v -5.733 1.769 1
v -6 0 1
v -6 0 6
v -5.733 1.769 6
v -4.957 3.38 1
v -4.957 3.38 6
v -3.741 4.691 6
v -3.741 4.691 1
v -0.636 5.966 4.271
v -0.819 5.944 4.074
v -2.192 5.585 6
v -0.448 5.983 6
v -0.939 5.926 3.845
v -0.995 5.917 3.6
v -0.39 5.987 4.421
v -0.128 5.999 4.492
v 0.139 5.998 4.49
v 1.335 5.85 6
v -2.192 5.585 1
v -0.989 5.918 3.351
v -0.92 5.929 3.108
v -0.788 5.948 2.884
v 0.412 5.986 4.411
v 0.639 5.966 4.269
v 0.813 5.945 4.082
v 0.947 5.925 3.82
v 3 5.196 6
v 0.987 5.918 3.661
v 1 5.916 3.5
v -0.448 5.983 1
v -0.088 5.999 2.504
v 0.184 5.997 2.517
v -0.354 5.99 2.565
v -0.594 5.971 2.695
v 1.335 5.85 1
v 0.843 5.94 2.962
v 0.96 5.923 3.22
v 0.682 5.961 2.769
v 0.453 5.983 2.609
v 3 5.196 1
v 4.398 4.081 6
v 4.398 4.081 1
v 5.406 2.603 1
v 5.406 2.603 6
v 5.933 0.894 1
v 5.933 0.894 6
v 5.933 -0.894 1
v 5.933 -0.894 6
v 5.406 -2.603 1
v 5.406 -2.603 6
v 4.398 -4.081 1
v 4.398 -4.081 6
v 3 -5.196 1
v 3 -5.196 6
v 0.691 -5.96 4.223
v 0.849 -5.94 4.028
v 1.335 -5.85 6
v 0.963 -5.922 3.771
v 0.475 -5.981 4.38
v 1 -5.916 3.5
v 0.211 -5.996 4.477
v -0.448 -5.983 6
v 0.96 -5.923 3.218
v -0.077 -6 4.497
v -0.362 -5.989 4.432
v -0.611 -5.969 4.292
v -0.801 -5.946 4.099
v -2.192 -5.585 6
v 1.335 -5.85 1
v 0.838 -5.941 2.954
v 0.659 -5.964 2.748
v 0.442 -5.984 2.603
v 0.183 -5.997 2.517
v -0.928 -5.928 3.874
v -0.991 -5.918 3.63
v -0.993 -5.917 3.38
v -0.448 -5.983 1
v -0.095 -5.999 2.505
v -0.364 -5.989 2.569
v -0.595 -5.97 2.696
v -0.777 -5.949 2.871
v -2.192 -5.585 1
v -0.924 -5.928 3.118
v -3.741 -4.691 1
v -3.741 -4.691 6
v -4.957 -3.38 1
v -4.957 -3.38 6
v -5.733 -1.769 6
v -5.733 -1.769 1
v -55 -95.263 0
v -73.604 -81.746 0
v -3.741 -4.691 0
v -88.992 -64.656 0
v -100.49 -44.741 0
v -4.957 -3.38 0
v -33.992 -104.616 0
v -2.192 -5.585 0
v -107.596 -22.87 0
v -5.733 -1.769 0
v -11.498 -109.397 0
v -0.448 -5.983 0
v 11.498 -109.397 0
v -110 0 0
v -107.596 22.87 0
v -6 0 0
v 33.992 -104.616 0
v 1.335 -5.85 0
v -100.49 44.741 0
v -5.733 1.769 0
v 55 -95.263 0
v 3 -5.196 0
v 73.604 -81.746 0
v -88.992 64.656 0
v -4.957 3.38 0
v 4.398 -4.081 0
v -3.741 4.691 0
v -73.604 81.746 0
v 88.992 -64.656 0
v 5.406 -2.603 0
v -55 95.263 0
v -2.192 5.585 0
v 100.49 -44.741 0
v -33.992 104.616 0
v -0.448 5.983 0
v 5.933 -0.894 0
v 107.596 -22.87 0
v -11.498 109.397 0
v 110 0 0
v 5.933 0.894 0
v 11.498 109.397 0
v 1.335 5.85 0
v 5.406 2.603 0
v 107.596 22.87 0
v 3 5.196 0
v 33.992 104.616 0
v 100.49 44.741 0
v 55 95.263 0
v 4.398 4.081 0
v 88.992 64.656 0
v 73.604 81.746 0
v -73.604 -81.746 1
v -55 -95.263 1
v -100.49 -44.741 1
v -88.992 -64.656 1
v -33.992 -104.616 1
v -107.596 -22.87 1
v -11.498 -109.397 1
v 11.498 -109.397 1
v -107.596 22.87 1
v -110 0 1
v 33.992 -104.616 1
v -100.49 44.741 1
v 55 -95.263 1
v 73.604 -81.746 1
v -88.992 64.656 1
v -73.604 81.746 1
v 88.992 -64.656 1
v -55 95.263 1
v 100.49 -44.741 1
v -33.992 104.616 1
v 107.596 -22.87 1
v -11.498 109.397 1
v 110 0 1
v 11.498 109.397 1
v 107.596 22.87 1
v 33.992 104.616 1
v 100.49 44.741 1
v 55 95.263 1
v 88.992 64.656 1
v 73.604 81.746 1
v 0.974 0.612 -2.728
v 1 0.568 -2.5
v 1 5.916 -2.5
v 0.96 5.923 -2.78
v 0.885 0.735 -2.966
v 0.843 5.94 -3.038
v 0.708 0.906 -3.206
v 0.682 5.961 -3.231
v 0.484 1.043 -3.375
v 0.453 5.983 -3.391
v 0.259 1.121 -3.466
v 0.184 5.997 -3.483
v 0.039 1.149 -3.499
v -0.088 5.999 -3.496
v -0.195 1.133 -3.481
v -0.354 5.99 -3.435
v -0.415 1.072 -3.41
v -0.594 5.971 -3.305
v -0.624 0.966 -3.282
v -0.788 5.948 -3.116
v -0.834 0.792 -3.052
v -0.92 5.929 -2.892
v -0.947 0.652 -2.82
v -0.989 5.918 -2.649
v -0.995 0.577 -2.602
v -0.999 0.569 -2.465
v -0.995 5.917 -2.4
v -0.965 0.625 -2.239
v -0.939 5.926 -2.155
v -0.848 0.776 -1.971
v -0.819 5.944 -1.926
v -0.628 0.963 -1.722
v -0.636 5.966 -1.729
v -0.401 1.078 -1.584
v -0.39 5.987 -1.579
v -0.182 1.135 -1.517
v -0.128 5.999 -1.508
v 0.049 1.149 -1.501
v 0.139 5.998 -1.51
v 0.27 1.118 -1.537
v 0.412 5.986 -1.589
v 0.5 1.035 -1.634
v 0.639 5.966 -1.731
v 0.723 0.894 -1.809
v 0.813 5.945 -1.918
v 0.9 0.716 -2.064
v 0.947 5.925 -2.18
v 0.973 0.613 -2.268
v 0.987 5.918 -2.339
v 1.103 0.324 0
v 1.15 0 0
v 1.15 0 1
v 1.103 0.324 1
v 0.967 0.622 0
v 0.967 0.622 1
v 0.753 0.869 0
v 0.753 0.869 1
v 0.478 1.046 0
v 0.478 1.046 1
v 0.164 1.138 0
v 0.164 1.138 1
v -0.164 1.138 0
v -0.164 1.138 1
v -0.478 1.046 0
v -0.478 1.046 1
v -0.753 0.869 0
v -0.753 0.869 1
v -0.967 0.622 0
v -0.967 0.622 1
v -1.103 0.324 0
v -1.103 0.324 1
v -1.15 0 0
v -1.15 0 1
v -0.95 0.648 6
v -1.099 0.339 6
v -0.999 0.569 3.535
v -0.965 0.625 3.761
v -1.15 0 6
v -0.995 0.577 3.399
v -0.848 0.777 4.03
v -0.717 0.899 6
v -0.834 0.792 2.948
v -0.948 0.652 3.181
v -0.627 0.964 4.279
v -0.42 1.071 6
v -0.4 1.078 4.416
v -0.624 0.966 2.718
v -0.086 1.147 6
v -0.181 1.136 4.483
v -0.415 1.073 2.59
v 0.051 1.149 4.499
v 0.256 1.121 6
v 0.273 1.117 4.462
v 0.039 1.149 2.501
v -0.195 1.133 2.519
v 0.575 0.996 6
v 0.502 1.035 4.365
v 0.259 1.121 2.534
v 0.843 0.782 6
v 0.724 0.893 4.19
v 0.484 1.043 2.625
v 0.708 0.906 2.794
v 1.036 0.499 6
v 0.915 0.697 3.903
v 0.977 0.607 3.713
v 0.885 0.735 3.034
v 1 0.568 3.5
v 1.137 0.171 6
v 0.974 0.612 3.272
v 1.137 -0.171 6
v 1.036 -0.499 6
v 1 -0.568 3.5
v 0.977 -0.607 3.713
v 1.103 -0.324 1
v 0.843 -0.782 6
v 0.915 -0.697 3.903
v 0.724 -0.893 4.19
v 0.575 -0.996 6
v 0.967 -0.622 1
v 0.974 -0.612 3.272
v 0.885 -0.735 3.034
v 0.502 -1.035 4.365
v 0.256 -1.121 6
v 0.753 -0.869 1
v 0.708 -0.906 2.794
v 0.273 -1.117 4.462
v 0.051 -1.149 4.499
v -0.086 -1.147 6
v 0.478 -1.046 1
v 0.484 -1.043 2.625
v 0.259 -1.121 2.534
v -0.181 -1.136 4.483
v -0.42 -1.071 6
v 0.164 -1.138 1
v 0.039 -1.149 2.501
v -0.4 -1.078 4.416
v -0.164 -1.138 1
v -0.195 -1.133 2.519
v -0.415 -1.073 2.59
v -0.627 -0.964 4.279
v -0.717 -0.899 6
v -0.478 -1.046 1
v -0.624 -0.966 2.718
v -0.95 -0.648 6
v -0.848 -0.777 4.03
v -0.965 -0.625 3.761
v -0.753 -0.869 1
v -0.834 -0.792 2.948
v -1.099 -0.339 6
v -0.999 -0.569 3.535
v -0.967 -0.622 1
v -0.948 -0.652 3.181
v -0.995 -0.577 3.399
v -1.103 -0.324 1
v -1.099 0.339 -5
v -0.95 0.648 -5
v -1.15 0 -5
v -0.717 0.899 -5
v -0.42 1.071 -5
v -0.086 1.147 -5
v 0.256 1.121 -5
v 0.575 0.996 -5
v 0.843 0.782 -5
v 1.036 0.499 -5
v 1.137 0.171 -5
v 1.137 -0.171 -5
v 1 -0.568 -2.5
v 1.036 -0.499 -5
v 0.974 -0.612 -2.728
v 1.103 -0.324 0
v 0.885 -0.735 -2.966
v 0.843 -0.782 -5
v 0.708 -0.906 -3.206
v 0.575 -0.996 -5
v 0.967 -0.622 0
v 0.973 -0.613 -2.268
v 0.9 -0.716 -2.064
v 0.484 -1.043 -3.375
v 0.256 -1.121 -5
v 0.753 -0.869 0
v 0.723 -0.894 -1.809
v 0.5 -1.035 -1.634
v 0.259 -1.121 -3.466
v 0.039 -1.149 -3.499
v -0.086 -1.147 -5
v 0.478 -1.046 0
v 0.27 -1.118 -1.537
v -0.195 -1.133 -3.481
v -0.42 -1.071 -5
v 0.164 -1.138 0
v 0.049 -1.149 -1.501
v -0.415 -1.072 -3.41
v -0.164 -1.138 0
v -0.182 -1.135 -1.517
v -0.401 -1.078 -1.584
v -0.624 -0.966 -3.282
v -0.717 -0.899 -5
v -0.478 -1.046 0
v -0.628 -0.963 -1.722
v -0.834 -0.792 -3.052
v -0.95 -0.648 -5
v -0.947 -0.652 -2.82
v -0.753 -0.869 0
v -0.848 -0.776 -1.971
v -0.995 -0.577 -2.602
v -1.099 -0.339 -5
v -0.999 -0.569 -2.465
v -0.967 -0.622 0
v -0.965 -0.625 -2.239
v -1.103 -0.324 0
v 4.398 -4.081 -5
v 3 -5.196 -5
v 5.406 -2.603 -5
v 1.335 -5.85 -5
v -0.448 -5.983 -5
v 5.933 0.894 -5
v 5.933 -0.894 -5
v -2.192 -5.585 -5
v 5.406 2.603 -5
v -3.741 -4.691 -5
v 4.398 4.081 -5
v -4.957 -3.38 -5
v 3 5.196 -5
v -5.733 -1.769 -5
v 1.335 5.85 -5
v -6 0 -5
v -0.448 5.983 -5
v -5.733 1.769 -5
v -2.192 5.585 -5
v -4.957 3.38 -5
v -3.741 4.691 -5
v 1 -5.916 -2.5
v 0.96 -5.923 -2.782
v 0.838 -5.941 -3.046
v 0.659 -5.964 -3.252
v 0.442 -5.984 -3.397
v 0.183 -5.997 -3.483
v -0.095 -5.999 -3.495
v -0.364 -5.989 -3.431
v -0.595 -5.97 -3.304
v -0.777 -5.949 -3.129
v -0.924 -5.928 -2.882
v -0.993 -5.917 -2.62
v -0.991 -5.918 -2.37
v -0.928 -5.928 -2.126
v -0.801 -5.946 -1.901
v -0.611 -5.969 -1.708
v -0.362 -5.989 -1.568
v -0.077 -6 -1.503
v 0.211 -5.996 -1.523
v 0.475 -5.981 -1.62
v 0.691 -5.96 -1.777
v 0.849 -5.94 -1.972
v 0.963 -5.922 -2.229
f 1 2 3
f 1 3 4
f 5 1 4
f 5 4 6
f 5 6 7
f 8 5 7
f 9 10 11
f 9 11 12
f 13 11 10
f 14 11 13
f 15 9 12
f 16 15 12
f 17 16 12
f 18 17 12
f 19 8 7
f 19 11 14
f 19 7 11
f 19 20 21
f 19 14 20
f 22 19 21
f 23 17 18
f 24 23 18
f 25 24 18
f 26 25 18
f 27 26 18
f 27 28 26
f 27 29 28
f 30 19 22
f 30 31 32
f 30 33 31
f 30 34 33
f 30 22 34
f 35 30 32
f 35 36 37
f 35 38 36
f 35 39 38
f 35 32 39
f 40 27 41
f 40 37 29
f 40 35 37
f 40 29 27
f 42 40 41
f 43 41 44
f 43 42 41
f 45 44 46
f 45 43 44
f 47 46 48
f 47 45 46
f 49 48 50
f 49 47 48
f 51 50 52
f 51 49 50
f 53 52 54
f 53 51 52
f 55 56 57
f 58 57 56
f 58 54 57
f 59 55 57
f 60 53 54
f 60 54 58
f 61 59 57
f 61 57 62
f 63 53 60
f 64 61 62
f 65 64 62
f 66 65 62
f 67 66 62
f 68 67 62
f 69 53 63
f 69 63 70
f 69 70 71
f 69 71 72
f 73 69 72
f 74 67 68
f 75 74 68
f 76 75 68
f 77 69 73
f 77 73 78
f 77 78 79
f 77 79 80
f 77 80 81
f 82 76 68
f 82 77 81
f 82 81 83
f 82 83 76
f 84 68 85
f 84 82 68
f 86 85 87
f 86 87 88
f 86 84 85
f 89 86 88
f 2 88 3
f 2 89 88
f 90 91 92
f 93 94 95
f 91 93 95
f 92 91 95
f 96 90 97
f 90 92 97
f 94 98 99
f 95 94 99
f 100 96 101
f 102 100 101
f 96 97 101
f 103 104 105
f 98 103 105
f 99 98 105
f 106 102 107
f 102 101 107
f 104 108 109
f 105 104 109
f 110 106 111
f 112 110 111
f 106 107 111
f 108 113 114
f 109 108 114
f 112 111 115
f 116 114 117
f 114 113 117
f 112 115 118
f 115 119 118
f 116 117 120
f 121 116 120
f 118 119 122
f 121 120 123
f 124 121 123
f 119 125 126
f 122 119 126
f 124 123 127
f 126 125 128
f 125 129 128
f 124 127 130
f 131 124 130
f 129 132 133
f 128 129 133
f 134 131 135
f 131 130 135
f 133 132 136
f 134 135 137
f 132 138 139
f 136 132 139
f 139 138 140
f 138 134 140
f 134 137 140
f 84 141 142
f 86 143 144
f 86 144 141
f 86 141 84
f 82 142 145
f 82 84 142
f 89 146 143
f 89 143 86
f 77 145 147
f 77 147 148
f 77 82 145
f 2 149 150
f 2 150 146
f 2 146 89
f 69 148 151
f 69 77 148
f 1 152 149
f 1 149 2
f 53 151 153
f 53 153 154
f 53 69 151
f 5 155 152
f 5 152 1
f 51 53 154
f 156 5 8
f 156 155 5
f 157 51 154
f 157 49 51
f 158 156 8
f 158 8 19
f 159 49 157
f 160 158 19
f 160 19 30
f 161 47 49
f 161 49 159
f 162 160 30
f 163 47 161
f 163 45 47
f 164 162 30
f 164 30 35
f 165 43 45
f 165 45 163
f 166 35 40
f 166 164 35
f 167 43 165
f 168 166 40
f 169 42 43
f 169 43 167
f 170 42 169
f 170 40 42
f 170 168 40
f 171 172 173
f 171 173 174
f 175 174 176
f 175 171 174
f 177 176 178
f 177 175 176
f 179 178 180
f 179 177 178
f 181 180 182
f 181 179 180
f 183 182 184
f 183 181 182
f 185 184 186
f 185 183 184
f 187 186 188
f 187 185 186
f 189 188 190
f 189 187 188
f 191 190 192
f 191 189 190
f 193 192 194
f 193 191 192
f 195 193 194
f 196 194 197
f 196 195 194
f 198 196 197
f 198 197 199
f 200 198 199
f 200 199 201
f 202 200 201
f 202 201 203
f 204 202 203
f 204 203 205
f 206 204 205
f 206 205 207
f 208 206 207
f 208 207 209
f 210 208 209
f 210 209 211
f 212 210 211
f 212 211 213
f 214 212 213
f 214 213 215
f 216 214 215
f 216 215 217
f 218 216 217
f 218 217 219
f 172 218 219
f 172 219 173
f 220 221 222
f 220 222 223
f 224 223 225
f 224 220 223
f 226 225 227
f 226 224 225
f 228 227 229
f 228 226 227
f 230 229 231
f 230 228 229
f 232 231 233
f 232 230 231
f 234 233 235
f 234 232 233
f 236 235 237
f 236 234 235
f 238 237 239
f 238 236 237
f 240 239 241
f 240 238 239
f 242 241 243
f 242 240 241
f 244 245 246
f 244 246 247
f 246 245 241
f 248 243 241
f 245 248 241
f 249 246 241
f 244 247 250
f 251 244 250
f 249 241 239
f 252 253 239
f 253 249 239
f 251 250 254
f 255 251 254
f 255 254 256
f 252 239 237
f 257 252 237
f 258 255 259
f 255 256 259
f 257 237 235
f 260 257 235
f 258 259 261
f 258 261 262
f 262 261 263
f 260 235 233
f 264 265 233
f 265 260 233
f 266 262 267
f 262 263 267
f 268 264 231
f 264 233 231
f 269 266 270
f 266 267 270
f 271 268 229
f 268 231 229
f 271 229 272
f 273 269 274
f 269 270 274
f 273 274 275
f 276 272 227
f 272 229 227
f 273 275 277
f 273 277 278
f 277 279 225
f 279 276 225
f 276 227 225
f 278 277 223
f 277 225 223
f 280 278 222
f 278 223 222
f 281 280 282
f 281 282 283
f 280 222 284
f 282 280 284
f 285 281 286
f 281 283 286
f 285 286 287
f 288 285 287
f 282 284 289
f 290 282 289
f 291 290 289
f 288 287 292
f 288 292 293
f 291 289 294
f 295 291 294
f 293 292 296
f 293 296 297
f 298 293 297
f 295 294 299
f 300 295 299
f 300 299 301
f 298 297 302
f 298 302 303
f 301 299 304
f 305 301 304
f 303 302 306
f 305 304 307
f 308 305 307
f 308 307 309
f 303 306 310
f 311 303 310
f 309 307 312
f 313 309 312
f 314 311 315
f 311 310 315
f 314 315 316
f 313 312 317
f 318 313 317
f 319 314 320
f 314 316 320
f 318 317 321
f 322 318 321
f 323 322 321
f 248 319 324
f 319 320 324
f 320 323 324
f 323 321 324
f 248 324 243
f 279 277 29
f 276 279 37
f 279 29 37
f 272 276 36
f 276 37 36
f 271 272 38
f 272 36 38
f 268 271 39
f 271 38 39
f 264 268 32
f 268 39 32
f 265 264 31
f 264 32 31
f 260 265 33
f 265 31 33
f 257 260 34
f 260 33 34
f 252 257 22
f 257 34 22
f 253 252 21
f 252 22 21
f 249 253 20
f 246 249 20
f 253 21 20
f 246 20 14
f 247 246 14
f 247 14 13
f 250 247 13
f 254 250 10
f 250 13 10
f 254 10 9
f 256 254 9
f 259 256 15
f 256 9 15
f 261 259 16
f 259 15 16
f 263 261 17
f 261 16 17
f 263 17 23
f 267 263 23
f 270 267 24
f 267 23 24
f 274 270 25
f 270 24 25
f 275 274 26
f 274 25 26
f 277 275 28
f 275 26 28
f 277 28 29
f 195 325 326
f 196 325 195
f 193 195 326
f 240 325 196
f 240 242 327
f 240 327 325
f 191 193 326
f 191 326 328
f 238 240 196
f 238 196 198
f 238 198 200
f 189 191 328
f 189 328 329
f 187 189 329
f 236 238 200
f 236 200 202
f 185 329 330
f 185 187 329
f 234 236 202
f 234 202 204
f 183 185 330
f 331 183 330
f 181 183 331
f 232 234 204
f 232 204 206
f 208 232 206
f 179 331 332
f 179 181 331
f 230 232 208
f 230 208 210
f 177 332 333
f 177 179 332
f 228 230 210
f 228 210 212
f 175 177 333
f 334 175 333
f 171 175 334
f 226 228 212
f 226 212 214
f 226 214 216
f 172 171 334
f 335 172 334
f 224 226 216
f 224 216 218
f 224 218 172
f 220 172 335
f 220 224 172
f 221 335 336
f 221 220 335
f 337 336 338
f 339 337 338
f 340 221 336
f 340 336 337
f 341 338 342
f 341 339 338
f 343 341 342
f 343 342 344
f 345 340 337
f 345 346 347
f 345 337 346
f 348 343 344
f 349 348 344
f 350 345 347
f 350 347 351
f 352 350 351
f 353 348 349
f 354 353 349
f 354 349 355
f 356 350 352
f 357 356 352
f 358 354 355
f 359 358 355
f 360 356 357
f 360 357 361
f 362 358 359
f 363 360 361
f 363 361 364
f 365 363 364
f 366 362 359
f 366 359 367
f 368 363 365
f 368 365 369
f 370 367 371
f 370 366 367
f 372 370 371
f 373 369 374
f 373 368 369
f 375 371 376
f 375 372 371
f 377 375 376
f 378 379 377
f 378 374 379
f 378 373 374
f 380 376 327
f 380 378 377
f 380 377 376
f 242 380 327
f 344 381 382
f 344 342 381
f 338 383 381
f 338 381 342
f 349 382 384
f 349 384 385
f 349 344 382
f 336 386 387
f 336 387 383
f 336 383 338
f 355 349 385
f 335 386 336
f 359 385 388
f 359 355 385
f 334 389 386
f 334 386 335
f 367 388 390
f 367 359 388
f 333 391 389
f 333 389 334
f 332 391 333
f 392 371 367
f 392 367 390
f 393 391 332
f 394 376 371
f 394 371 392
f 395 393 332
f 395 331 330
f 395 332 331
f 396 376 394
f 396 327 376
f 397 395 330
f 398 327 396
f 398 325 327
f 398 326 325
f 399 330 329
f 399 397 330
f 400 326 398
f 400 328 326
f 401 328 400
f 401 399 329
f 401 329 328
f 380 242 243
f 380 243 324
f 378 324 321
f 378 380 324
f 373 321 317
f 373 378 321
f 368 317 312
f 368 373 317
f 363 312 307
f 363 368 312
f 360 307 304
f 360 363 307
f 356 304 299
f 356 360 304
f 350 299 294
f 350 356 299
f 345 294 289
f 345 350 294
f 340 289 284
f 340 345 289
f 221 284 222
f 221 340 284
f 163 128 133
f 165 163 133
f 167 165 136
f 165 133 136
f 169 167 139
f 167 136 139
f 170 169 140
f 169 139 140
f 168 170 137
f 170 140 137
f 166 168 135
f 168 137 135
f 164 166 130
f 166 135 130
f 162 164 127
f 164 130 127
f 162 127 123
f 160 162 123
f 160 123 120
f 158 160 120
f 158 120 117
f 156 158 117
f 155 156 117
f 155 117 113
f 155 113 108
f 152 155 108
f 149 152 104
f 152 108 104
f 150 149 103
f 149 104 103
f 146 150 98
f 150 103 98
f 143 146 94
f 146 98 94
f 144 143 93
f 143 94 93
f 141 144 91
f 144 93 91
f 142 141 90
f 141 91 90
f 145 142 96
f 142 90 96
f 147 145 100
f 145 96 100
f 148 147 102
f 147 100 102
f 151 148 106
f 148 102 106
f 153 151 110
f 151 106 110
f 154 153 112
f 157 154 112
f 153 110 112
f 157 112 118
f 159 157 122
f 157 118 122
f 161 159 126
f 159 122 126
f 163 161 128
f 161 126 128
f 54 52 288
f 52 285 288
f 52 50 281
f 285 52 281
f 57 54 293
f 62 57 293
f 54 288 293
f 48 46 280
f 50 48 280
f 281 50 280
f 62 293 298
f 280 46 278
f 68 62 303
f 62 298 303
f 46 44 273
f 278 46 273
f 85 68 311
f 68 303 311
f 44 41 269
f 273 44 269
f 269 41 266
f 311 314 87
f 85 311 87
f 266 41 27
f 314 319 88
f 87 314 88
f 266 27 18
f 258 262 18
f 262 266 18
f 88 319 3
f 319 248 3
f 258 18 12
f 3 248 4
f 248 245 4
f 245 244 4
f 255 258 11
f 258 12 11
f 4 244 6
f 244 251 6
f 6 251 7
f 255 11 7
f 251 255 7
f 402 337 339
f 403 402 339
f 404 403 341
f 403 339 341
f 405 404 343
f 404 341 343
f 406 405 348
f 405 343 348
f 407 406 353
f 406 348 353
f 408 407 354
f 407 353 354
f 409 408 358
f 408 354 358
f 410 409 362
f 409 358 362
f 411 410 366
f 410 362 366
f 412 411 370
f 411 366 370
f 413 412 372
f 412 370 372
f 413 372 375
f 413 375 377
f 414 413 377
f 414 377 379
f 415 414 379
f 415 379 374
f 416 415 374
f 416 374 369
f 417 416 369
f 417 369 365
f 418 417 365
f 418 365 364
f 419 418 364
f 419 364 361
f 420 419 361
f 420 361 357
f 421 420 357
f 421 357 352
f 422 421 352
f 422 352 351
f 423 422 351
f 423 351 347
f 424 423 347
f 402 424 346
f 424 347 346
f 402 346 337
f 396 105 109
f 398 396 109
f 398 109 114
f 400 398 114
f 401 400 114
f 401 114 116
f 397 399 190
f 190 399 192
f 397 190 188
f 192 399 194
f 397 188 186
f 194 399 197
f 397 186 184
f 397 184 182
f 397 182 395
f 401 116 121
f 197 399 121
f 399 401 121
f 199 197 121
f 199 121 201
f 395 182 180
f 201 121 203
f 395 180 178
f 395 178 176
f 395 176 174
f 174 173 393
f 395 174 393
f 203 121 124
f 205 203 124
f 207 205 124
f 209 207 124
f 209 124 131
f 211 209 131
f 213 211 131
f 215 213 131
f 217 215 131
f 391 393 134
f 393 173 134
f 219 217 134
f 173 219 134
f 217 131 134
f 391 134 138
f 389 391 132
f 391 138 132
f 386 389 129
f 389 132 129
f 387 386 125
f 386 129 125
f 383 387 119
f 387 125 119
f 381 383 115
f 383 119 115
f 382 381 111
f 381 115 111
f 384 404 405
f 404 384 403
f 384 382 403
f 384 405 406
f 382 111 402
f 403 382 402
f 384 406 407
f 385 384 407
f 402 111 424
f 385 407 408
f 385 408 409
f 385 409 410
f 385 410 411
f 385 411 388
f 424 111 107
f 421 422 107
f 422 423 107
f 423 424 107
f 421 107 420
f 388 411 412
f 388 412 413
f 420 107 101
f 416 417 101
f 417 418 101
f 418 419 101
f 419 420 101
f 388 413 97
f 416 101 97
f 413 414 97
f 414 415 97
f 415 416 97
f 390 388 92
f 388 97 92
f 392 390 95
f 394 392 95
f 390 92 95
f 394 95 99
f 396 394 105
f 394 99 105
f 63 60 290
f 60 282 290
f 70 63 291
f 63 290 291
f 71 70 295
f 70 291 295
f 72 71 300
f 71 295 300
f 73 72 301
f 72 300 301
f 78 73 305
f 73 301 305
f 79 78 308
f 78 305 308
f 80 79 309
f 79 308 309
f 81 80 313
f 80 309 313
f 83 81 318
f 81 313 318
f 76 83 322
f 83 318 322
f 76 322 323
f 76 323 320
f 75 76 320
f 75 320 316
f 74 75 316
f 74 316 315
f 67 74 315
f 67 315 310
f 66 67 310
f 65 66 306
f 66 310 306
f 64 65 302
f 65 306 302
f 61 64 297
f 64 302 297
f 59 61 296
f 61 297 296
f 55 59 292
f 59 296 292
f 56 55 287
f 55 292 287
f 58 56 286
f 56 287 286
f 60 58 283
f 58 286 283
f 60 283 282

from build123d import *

# Parameters (mm, degrees)
SKETCH_1_R           = 110
SKETCH_1_R_2         = 1.15
EXTRUDE_1_DEPTH      = 1
SKETCH_2_R           = 6
SKETCH_2_R_2         = 1.15
EXTRUDE_2_DEPTH      = 5
EXTRUDE_2_DEPTH_BACK = 6
SKETCH_3_R           = 1
CUT_EXTRUDE_1_DEPTH  = 25


with BuildPart() as part:
    # 草图1 → 凸台-拉伸1 (new body)
    with BuildSketch(Plane.XY):
        Circle(SKETCH_1_R)
        Circle(SKETCH_1_R_2, mode=Mode.SUBTRACT)
    extrude(amount=EXTRUDE_1_DEPTH)

    # 草图2 → 凸台-拉伸2 (add, two sides)
    with BuildSketch(Plane(origin=(0, 0, 0), x_dir=(-1, 0, 0), z_dir=(0, 0, -1))) as extrude_2_sk:
        Circle(SKETCH_2_R)
        Circle(SKETCH_2_R_2, mode=Mode.SUBTRACT)
    extrude(amount=EXTRUDE_2_DEPTH)
    extrude(extrude_2_sk.sketch, amount=-EXTRUDE_2_DEPTH_BACK)

    # 草图3 → 切除-拉伸1 (cut, symmetric)
    with BuildSketch(Plane(origin=(0, 0, 0), x_dir=(1, 0, 0), z_dir=(0, 1, 0))):
        with Locations((0, 2.5)):
            Circle(SKETCH_3_R)
        with Locations((0, -3.5)):
            Circle(SKETCH_3_R)
    extrude(amount=CUT_EXTRUDE_1_DEPTH, both=True, mode=Mode.SUBTRACT)


solid = part.part
